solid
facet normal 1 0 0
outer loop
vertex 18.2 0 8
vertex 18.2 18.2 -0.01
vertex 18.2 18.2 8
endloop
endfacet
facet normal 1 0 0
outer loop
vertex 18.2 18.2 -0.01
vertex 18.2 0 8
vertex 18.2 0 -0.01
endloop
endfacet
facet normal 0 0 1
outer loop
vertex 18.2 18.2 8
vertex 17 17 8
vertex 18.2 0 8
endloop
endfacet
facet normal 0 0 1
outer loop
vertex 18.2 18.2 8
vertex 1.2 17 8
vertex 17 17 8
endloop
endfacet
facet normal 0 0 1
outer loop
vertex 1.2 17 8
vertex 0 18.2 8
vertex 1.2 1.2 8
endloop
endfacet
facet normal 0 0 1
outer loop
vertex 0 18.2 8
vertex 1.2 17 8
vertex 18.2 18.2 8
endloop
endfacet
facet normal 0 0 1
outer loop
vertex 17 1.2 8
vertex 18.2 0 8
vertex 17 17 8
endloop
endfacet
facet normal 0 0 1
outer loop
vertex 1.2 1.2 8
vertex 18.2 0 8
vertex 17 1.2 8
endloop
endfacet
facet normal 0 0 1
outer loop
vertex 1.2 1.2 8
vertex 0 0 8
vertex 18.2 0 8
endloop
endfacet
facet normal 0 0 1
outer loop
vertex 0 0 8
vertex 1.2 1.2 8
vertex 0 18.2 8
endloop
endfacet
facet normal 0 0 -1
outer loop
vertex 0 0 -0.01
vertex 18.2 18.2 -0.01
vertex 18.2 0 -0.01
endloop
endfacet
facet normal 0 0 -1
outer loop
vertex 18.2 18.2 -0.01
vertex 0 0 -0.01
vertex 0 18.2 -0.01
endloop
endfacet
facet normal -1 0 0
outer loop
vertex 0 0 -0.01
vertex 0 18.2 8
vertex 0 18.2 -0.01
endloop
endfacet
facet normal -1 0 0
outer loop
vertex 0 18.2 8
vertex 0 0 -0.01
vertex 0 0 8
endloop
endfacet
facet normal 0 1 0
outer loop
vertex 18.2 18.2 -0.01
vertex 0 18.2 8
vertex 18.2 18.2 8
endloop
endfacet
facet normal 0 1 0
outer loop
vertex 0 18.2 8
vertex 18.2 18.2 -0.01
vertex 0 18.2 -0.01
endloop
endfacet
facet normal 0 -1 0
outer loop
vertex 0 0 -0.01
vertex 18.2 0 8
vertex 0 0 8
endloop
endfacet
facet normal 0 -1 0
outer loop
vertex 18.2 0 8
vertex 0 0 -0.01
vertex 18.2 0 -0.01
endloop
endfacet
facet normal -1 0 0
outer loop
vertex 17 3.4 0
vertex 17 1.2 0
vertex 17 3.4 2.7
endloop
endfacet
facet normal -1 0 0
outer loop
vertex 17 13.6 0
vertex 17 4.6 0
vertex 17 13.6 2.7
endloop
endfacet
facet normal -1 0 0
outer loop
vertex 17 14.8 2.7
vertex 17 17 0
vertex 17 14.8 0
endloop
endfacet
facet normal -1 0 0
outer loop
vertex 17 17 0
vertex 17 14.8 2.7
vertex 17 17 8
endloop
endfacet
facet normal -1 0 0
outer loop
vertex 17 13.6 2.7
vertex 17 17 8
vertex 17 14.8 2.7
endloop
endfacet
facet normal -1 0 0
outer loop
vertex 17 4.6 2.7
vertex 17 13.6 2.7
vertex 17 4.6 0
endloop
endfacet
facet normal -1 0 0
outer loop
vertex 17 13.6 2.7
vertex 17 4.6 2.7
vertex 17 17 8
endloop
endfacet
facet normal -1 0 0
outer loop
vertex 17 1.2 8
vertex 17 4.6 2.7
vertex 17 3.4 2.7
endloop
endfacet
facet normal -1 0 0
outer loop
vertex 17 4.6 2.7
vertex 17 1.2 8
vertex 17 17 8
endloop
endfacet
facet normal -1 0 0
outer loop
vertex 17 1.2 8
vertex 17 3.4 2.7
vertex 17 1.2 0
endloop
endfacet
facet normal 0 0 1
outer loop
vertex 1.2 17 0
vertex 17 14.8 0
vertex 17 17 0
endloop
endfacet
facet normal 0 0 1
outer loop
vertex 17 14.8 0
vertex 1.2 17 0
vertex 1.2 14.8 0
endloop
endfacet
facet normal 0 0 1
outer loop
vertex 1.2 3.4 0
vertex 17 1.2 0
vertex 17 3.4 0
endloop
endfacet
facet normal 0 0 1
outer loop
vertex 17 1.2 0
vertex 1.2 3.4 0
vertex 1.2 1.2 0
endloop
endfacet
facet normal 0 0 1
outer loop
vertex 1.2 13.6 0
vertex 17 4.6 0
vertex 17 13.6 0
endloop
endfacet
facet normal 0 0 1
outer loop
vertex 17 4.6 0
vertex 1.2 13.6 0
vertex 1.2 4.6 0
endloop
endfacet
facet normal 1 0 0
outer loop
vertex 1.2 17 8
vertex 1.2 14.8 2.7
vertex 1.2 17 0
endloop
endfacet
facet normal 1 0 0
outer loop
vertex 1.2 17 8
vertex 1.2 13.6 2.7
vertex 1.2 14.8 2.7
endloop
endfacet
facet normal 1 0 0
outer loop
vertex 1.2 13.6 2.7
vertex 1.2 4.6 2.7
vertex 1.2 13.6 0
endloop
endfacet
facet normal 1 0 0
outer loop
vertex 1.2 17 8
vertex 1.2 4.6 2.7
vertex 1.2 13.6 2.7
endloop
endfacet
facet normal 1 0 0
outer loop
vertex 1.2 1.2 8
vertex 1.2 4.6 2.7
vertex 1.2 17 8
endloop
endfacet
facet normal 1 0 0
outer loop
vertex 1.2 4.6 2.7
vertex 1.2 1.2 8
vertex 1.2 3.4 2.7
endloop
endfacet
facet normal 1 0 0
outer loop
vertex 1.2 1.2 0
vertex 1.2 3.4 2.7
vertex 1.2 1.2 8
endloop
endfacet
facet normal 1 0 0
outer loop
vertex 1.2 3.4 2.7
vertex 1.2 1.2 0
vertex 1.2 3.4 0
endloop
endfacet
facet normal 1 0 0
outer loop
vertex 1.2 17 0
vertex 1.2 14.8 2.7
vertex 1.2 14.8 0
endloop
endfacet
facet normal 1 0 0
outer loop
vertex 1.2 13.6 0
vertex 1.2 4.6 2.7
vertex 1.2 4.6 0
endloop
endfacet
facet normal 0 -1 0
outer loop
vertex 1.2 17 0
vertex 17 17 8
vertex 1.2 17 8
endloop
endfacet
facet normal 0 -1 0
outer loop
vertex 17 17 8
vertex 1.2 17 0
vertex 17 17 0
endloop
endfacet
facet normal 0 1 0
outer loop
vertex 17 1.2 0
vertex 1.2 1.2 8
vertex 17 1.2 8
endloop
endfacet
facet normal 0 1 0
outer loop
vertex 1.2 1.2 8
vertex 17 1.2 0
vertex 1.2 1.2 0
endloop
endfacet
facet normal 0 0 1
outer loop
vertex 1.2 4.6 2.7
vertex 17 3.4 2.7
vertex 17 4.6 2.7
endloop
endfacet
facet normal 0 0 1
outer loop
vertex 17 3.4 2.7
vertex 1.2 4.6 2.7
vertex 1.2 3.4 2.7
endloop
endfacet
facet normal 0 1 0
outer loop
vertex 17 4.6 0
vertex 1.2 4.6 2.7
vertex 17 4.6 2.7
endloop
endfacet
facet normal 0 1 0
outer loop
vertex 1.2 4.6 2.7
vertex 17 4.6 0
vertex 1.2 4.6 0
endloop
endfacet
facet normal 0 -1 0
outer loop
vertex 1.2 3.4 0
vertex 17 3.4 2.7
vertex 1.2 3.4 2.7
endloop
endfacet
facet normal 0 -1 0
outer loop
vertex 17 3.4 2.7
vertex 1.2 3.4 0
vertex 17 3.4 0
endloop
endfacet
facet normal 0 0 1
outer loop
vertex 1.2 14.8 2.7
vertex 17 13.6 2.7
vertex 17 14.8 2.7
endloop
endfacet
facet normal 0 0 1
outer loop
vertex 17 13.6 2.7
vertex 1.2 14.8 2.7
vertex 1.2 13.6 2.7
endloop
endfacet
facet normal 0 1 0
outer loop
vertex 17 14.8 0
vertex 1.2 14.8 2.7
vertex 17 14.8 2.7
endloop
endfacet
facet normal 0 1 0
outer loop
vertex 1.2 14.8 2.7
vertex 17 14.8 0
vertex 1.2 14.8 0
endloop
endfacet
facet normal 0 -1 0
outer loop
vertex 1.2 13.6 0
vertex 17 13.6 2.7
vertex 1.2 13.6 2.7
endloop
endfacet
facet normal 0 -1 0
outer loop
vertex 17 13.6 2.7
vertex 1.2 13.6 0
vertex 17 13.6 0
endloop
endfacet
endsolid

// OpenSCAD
// file: ../Base/Rotation.scad
// Fischertechnik Box Foundation
// Geometry Helpers Rotation

include <PlacementOptions.scad>

// getRotatedSpace(space, rotation=NoRotation)
// Rotates the space dependent on the specified rotation

function getRotatedSpace(space, rotation=NoRotation) = [
    (rotation == Rotate90 || rotation == Rotate270) ? space.y : space.x,
    (rotation == Rotate90 || rotation == Rotate270) ? space.x : space.y
];

// Rotates the given space around the fixed left lower corner
// space = the space the children needs as width/depth list [width,depth]
// rotation = 0 Rotate0 degrees, 1 Rotate90 degrees, 2 Rotate180 degrees, 3 Rotate270 degrees (equivalent to -90)

module RotateFix(space, rotation=NoRotation) {
    dy = (rotation == Rotate0 || rotation == Rotate270) ? 0 :
        (rotation == Rotate90) ? space.x :
        space.y;
    dx = (rotation < Rotate180) ? 0 :
        (rotation == Rotate180) ? space.x :
        space.y;
    
    translate([dx, dy, 0])
        rotate([0, 0, rotations[rotation]])
            children();
}
// file: ../Base/Alignment.scad
// Fischertechnik Box Foundation
// Geometry Helpers Alignment

include <PlacementOptions.scad>

// getAlignedX(elementWidth, spaceWidth, align=AlignRight, offset=0)
// Gets the aligned X offset of an element with the given
// width in the given space.
// elementWidth = The width of the element to positon
// spaceWidth = The space where the element should be aligned
// align = 0 AlignLeft, 1 AlignCenter, 2 AlignRight
// offset = an optional offset from the aligned position. When
// aligned left or centered, then positive values are in X direction.
// When aligned right then positive values are in negative X direction.

function getAlignedX(elementWidth, spaceWidth, align=AlignRight, offset=0) =
    (align == AlignLeft) ?
        offset :
        ((align == AlignCenter) ?
        (spaceWidth - elementWidth)/2 + offset :
        spaceWidth - offset - elementWidth);

// getAlignedY(elementDepth, spaceDepth, align=AlignTop, offset=0)
// Gets the aligned Y offset of an element with the given
// depth in the given space.
// elementDepth = The depth of the element to positon
// spaceDepth = The space where the element should be aligned
// align = 0 AlignBottom, 1 AlignCenter, 2 AlignTop
// offset = an optional offset from the aligned position. When
// aligned bottom or centered, then positive values are in Y direction.
// When aligned top then positive values are in negative Y direction.

function getAlignedY(elementDepth, spaceDepth, align=AlignTop, offset=0) =
    (align == AlignBottom) ?
        offset :
        ((align == AlignCenter) ?
        (spaceDepth - elementDepth)/2 + offset :
        spaceDepth - offset - elementDepth);
// file: ../Base/PlacementOptions.scad
// Fischertechnik Box Foundation
// Placement Options

// Alignment
NoAlign = 0;
AlignLeft = 1;
AlignBottom = 2;
AlignCenter = 3;
AlignRight = 4;
AlignTop = 5;

// Element rotation degree steps
rotations = [0, -90, -180, -270];

// Rotation
NoRotation = 0;
Rotate0 = 0;
Rotate90 = 1;
Rotate180 = 2;
Rotate270 = 3;

// Docking (seen from above)
NoDock = -1;
DockLeft = 0;
DockTop = 1;
DockRight = 2;
DockCorner = 2;
DockBottom = 3;

// Web corners
LowerLeft = 0;
UpperLeft = 1;
UpperRight = 2;
LowerRight = 3;

// Web position relative to corner
LeftOfCorner = 0;
RightOfCorner = 1;
// file: ../Base/Boxes.scad
// Fischertechnik Box Foundation
// Pre-designed Boxes

use <Constants.scad>

include <PlacementOptions.scad>

box190Width = 190;
box190Depth = 130;
box130Width = 130;
box130Depth = 95;

// Values are from an original ec3 box
topBottomDifference = 1.5;
outerHeight = 40;
innerHeight = 38.2;
baseThickness = outerHeight - innerHeight;
stackExcess = 5.7;
radius = 3.5;
wallThickness = 1.5;
tolerance = 0.2;
stackOffset = innerHeight - stackExcess;

boxUsageHeight = stackOffset;
boxWallThickness = wallThickness;
boxBaseThickness = baseThickness;
boxWebWidth = 3.0;

// getBoxWallThickness()
// Gets the wall thickness of a Fischertechnik Box
function getBoxWallThickness() = boxWallThickness;

// getBoxUsageHeight()
// Gets the usable height of a Fischertechnik box
function getBoxUsageHeight() = boxUsageHeight;

// getBoxInnerHeight()
// Gets the inner height of a Fischertechnik box, including the stack excess
function getBoxInnerHeight() = innerHeight;

// getBoxBaseThickness()
// Gets the thickness of the Fischertechnik box base.
function getBoxBaseThickness() = boxBaseThickness;

// getBoxWebWidth()
// Gets the width of a box web
function getBoxWebWidth() = boxWebWidth;

// getBox190Space()
// Gets the usable inner space of a Box 190 as an x/y-list
function getBox190Space() = [
    box190Width - 2*getBoxWallThickness() - topBottomDifference, 
    box190Depth - 2*getBoxWallThickness() - topBottomDifference ];

// BoxBase(width, depth)
// Creates an empty stackable Fischertechnik compatible box
// width = Outer width of the box (190, 130, ...)
// depth = Outer depth of the box (130, 95, ...)

module BoxBase(width, depth, height=outerHeight) {    
    thinPlate = 0.01;

    innerHeight = height - baseThickness;    
    
    module BodyPlate(width, depth) {
        translate([radius, radius])
        hull() {
            w = width-2*radius;
            d = depth-2*radius;
            cube([w, d, thinPlate]);
            cylinder(thinPlate, r=radius, $fn=getFragments());
            translate([w, 0])
                cylinder(thinPlate, r=radius, $fn=getFragments());
            translate([w, d])
                cylinder(thinPlate, r=radius, $fn=getFragments());
            translate([0, d])
                cylinder(thinPlate, r=radius, $fn=getFragments());
        }
    }
    
    module Body(tolerance=tolerance) {
        hull() {
            // Bottom with tolerance to fit into the original boxes when stacked
            translate([-wallThickness+tolerance, -wallThickness+tolerance, -baseThickness])
                BodyPlate(width-topBottomDifference-2*tolerance, depth-topBottomDifference-2*tolerance);
            
            // Top
            translate([-wallThickness-topBottomDifference/2, -wallThickness-topBottomDifference/2, innerHeight-thinPlate])
                BodyPlate(width, depth);
         }
    }

    module Cutoff() {
        hull() {
            coWidth = width - 2*wallThickness;
            coDepth = depth - 2*wallThickness;
            
            // Bottom
            BodyPlate(coWidth-topBottomDifference, coDepth-topBottomDifference);

            // Top
            translate([-topBottomDifference/2, -topBottomDifference/2, innerHeight+thinPlate]) 
                BodyPlate(coWidth, coDepth);
        }
    }
    
    difference() {        
        Body();
        Cutoff();
        stackOffset = innerHeight - stackExcess;
        translate([0, 0, stackOffset + baseThickness])
            Body(tolerance=0);
    }
}

// Creates the Fischertechnik empty box 130x190 mm and places it at position 0,0
// 190x130 are the outer sizes, the inner space is slightly smaller. Use getBox190Space() to get the inner sizes.
// The box is positioned that the usable inner space is at the 0,0,0 position. The

module Box190() {
    BoxBase(box190Width, box190Depth);
}

// Gets the usable inner space of a Box 130 as an x/y-list
function getBox130Space() = [
    box130Width - 2*getBoxWallThickness() - topBottomDifference, 
    box130Depth - 2*getBoxWallThickness() - topBottomDifference ];

// Creates the Fischertechnik empty box 95x130 mm and places it at position 0,0
// 190x130 are the outer sizes, the inner space is slightly smaller. Use getBox190Space() to get the inner sizes.
// The box is positioned that the usable inner space is at the 0,0,0 position. The

module Box130() {
    BoxBase(box130Width, box130Depth);
}

// Creates a web at the specified box walls
// corner 0 = LowerLeft, 1 = UpperLeft, 2 = UpperRight, 3 = LowerRight
// side 0 = LeftOfCorner, 1 = RightOfCorner
// distance = Distance in mm from the corner
// boxSpace = inner width and depth of the box (default: Box 190)
// webWidth = length of the web (default is 3 mms)
// webThickness = thickness of the web (default is 1 mm)

module BoxWeb(corner, side, distance, boxSpace=getBox190Space(), webWidth=getBoxWebWidth(), webThickness=1.0) {
    sink = getBoxWallThickness()/2;

    width = (corner % 2 == 0) ? 
            (side == LeftOfCorner ? webWidth : webThickness) :
            (side == LeftOfCorner ? webThickness : webWidth);

    depth = (corner % 2 == 0) ? 
            (side == RightOfCorner ? webWidth : webThickness) :
            (side == RightOfCorner ? webThickness : webWidth);
    
    xDiff = corner == LowerLeft ? 
                (side == LeftOfCorner ? -sink : distance) :
            (corner == UpperLeft ?                
                (side == LeftOfCorner ? distance : -sink) :
            (corner == UpperRight ?
                (side == LeftOfCorner ? boxSpace.x-webWidth+sink : boxSpace.x-distance-webThickness) :
                (side == LeftOfCorner ? boxSpace.x-distance-webThickness: boxSpace.x-webWidth+sink)));

    yDiff = corner == LowerLeft ? 
                (side == RightOfCorner ? -sink : distance) :
            (corner == UpperLeft ?
                (side == RightOfCorner ? boxSpace.y-distance : boxSpace.y-webWidth+sink) :
            (corner == UpperRight ?
                (side == RightOfCorner ? boxSpace.y-webWidth+sink : boxSpace.y-distance) :
                (side == RightOfCorner ? distance : -sink)));
    
    translate([xDiff, yDiff, -getExcess()])
        cube([width, depth, boxUsageHeight + 2*getExcess()]);
}
// file: ../Base/Placement.scad
// Fischertechnik Box Foundation
// Geometry Helpers Placement

use <Constants.scad>
use <Alignment.scad>
use <Rotation.scad>
use <Boxes.scad>

include <PlacementOptions.scad>

// Place(x=0, y=0, elementSpace=[0,0], alignX=AlignLeft, alignY=AlignBottom, rotation=Rotate0, boxSpace=getBox190Space())
// Places the child at the specified position
// y = Y-Position. This is a relative position when an X aligment is specified.
// x = X-Position. This is a relative position when an Y aligment is specified.
// elementSpace = space of the element to be placed [x,y]
// alignX = -1=NoAlign, 0 AlignLeft, 1 AlignCenter, 3 AlignRight (elementSpace and boxSpace required!)
// alignY = -1=NoAlign, 2 AlignBottom, 1 AlignCenter, 4 AlignTop (elementSpace and boxSpace required!)
// rotation = 0 Rotate0 0 degrees, 1 Rotate90 90 degrees, 
// 2 Rotate180 180 degrees, 3 Rotate270 270 degrees (equivalent to -90)
// boxSpace = Inner space of the box where the placement occurs [x,y] - default is Box 190x130 inner space

module Place(x=0, y=0, elementSpace=[0,0], 
  alignX=AlignLeft, alignY=AlignBottom, 
  rotation=NoRotation, boxSpace=getBox190Space()) {

    module Position(x, y, space, rotation=Rotate0) {
        translate([x, y, 0])
            RotateFix(space, rotation)
                children();
    }

    space = getRotatedSpace(elementSpace, rotation);
    alignedX = getAlignedX(space.x, boxSpace.x, alignX, x);
    alignedY = getAlignedY(space.y, boxSpace.y, alignY, y);
    Position(alignedX, alignedY, elementSpace, rotation)
        children();
}

// Center(space=getBox130Space(), elementSpace=[0,0])
// space = Space where the children is centered. For cylinder use centered=true and no elementSpace.
// elementSpace = space of the element to be centered [x,y]

module Center(space=getBox190Space(), elementSpace=[0,0]) {
    Place(elementSpace=elementSpace, boxSpace=space, alignX=AlignCenter, alignY=AlignCenter)
        children();
}

// CenterHorizontal(width=0, y=0, offset=0, space=getBox130Space())
// width = Width of the element to be placed.
// y = Y position of the element
// offset = Offset from the center position (negative will be left of the center)
// space = Space where the element is placed

module CenterHorizontal(width=0, y=0, offset=0, space=getBox190Space()) {
    Place(x=offset, y=y, elementSpace=[width, 0], boxSpace=space, alignX=AlignCenter)
        children(0);
}

// CenterVertical(depth=0, x=0, offset=0, space=getBox130Space())
// depth = Depth of the element to be placed.
// x = X position of the element
// offset = Offset from the center position (negative will be down of the center)
// space = Space where the element is placed

module CenterVertical(depth=0, x=0, offset=0, space=getBox190Space()) {
    Place(x=x, y=offset, elementSpace=[0, depth], boxSpace=space, alignY=AlignCenter)
        children(0);
}

// getIsVertical(align)
// True if the specified alignment needs a vertical orientation for a divider (AlignRight, AlignLeft)

function getIsVertical(align) = (align == AlignRight || align == AlignLeft);

// getIsHorizontal(align)
// True if the specified alignment needs a horizontal orientation for a divider (AlignTop, AlignBottom)

function getIsHorizontal(align) = (align == AlignTop || align == AlignBottom);
// file: ../Base/Constants.scad
// Fischertechnik Box Foundation
// Constants

// Constant values necessary for multiple elements

// Base constants
dividerThickness = 1.2;
excess = 0.01;
fragments = 90;
tolerance = 0.8;

// Gets the thickness of a divider 
function getDividerThickness() = dividerThickness;

// Gets the excess that is used to merge walls into each other
function getExcess() = excess;

// Gets amount of fragments of a cylinder
function getFragments() = fragments;

// Gets the inner tolerance of a frame to each side
function getTolerance() = tolerance;


// Fischertechnik specific constants
axisDiameter = 4;
axisBottomDiameter = axisDiameter + 1;
standardEdgeDistance = 2.5;
standardWebDistance = 11.5;
standardCornerLength = 15;
tubeWallFactor = 0.8;
smallPartsFrameHeight = 20;

// Gets axis diameter
function getAxisDiameter() = axisDiameter;

// Gets axis bottom diameter for thicker part at the bottom
function getAxisBottomDiameter() = axisBottomDiameter;

// gets the standard distance to the wall of the box for dockable frames with webs
function getStandardEdgeDistance() = standardEdgeDistance;

// gets the standard distance of each web to the corner of the dockable frame
function getStandardWebDistance() = standardWebDistance;

// gets the standard length of the corner walls of a dockable frame
function getStandardCornerLength() = standardCornerLength;

// gets the wall thickness of a tube.
function getTubeWallThickness() = tubeWallFactor * getDividerThickness();

// gets the frame height for docked small parts boxes.
function getSmallPartsFrameHeight() = smallPartsFrameHeight;
// main file
// Fischertechnik Box Library
// Frame for Building Blocks with Connector
// 38240, 37636

use <../Base/Constants.scad>
use <../ModelBase/Simple.scad>

/* [Element Parameters] */
count = 1;
height = 8;

/* [Hidden] */
width = 15;
depth = 15;

// getFrameBlockWithPinSpace()
// Gets the space the frame block with pin needs as width (.x and .y as a list)
// for the specified count of blocks

function getFrameBlockWithPinSpace(count = 1) = getFrameOuterVolume([width * count, depth, height]);

// FrameBlockWithPin(count, height=8)
// Frame for count standing building blocks with pin down
// count = Count of blocks
// height = Height of the frame (default is 8)

module FrameBlockWithPin(count = 1, height=height) {
    railWidth = getFrameBlockWithPinSpace(count).x;
    railHeight = 2.7;
    railDistance = 9;
    
    module Rails() {
        Wall([railWidth, getDividerThickness(), railHeight]);
        translate([0, railDistance + getDividerThickness()])
            Wall([railWidth, getDividerThickness(), railHeight]);
    }

    Frame([width*count, depth, height]);

    railsDepth = railDistance + 2*getDividerThickness();

    translate([0, (getFrameBlockWithPinSpace(count).y - railsDepth) / 2]) 
        Rails();
}

// Test
color("lightgray")
FrameBlockWithPin(count);
